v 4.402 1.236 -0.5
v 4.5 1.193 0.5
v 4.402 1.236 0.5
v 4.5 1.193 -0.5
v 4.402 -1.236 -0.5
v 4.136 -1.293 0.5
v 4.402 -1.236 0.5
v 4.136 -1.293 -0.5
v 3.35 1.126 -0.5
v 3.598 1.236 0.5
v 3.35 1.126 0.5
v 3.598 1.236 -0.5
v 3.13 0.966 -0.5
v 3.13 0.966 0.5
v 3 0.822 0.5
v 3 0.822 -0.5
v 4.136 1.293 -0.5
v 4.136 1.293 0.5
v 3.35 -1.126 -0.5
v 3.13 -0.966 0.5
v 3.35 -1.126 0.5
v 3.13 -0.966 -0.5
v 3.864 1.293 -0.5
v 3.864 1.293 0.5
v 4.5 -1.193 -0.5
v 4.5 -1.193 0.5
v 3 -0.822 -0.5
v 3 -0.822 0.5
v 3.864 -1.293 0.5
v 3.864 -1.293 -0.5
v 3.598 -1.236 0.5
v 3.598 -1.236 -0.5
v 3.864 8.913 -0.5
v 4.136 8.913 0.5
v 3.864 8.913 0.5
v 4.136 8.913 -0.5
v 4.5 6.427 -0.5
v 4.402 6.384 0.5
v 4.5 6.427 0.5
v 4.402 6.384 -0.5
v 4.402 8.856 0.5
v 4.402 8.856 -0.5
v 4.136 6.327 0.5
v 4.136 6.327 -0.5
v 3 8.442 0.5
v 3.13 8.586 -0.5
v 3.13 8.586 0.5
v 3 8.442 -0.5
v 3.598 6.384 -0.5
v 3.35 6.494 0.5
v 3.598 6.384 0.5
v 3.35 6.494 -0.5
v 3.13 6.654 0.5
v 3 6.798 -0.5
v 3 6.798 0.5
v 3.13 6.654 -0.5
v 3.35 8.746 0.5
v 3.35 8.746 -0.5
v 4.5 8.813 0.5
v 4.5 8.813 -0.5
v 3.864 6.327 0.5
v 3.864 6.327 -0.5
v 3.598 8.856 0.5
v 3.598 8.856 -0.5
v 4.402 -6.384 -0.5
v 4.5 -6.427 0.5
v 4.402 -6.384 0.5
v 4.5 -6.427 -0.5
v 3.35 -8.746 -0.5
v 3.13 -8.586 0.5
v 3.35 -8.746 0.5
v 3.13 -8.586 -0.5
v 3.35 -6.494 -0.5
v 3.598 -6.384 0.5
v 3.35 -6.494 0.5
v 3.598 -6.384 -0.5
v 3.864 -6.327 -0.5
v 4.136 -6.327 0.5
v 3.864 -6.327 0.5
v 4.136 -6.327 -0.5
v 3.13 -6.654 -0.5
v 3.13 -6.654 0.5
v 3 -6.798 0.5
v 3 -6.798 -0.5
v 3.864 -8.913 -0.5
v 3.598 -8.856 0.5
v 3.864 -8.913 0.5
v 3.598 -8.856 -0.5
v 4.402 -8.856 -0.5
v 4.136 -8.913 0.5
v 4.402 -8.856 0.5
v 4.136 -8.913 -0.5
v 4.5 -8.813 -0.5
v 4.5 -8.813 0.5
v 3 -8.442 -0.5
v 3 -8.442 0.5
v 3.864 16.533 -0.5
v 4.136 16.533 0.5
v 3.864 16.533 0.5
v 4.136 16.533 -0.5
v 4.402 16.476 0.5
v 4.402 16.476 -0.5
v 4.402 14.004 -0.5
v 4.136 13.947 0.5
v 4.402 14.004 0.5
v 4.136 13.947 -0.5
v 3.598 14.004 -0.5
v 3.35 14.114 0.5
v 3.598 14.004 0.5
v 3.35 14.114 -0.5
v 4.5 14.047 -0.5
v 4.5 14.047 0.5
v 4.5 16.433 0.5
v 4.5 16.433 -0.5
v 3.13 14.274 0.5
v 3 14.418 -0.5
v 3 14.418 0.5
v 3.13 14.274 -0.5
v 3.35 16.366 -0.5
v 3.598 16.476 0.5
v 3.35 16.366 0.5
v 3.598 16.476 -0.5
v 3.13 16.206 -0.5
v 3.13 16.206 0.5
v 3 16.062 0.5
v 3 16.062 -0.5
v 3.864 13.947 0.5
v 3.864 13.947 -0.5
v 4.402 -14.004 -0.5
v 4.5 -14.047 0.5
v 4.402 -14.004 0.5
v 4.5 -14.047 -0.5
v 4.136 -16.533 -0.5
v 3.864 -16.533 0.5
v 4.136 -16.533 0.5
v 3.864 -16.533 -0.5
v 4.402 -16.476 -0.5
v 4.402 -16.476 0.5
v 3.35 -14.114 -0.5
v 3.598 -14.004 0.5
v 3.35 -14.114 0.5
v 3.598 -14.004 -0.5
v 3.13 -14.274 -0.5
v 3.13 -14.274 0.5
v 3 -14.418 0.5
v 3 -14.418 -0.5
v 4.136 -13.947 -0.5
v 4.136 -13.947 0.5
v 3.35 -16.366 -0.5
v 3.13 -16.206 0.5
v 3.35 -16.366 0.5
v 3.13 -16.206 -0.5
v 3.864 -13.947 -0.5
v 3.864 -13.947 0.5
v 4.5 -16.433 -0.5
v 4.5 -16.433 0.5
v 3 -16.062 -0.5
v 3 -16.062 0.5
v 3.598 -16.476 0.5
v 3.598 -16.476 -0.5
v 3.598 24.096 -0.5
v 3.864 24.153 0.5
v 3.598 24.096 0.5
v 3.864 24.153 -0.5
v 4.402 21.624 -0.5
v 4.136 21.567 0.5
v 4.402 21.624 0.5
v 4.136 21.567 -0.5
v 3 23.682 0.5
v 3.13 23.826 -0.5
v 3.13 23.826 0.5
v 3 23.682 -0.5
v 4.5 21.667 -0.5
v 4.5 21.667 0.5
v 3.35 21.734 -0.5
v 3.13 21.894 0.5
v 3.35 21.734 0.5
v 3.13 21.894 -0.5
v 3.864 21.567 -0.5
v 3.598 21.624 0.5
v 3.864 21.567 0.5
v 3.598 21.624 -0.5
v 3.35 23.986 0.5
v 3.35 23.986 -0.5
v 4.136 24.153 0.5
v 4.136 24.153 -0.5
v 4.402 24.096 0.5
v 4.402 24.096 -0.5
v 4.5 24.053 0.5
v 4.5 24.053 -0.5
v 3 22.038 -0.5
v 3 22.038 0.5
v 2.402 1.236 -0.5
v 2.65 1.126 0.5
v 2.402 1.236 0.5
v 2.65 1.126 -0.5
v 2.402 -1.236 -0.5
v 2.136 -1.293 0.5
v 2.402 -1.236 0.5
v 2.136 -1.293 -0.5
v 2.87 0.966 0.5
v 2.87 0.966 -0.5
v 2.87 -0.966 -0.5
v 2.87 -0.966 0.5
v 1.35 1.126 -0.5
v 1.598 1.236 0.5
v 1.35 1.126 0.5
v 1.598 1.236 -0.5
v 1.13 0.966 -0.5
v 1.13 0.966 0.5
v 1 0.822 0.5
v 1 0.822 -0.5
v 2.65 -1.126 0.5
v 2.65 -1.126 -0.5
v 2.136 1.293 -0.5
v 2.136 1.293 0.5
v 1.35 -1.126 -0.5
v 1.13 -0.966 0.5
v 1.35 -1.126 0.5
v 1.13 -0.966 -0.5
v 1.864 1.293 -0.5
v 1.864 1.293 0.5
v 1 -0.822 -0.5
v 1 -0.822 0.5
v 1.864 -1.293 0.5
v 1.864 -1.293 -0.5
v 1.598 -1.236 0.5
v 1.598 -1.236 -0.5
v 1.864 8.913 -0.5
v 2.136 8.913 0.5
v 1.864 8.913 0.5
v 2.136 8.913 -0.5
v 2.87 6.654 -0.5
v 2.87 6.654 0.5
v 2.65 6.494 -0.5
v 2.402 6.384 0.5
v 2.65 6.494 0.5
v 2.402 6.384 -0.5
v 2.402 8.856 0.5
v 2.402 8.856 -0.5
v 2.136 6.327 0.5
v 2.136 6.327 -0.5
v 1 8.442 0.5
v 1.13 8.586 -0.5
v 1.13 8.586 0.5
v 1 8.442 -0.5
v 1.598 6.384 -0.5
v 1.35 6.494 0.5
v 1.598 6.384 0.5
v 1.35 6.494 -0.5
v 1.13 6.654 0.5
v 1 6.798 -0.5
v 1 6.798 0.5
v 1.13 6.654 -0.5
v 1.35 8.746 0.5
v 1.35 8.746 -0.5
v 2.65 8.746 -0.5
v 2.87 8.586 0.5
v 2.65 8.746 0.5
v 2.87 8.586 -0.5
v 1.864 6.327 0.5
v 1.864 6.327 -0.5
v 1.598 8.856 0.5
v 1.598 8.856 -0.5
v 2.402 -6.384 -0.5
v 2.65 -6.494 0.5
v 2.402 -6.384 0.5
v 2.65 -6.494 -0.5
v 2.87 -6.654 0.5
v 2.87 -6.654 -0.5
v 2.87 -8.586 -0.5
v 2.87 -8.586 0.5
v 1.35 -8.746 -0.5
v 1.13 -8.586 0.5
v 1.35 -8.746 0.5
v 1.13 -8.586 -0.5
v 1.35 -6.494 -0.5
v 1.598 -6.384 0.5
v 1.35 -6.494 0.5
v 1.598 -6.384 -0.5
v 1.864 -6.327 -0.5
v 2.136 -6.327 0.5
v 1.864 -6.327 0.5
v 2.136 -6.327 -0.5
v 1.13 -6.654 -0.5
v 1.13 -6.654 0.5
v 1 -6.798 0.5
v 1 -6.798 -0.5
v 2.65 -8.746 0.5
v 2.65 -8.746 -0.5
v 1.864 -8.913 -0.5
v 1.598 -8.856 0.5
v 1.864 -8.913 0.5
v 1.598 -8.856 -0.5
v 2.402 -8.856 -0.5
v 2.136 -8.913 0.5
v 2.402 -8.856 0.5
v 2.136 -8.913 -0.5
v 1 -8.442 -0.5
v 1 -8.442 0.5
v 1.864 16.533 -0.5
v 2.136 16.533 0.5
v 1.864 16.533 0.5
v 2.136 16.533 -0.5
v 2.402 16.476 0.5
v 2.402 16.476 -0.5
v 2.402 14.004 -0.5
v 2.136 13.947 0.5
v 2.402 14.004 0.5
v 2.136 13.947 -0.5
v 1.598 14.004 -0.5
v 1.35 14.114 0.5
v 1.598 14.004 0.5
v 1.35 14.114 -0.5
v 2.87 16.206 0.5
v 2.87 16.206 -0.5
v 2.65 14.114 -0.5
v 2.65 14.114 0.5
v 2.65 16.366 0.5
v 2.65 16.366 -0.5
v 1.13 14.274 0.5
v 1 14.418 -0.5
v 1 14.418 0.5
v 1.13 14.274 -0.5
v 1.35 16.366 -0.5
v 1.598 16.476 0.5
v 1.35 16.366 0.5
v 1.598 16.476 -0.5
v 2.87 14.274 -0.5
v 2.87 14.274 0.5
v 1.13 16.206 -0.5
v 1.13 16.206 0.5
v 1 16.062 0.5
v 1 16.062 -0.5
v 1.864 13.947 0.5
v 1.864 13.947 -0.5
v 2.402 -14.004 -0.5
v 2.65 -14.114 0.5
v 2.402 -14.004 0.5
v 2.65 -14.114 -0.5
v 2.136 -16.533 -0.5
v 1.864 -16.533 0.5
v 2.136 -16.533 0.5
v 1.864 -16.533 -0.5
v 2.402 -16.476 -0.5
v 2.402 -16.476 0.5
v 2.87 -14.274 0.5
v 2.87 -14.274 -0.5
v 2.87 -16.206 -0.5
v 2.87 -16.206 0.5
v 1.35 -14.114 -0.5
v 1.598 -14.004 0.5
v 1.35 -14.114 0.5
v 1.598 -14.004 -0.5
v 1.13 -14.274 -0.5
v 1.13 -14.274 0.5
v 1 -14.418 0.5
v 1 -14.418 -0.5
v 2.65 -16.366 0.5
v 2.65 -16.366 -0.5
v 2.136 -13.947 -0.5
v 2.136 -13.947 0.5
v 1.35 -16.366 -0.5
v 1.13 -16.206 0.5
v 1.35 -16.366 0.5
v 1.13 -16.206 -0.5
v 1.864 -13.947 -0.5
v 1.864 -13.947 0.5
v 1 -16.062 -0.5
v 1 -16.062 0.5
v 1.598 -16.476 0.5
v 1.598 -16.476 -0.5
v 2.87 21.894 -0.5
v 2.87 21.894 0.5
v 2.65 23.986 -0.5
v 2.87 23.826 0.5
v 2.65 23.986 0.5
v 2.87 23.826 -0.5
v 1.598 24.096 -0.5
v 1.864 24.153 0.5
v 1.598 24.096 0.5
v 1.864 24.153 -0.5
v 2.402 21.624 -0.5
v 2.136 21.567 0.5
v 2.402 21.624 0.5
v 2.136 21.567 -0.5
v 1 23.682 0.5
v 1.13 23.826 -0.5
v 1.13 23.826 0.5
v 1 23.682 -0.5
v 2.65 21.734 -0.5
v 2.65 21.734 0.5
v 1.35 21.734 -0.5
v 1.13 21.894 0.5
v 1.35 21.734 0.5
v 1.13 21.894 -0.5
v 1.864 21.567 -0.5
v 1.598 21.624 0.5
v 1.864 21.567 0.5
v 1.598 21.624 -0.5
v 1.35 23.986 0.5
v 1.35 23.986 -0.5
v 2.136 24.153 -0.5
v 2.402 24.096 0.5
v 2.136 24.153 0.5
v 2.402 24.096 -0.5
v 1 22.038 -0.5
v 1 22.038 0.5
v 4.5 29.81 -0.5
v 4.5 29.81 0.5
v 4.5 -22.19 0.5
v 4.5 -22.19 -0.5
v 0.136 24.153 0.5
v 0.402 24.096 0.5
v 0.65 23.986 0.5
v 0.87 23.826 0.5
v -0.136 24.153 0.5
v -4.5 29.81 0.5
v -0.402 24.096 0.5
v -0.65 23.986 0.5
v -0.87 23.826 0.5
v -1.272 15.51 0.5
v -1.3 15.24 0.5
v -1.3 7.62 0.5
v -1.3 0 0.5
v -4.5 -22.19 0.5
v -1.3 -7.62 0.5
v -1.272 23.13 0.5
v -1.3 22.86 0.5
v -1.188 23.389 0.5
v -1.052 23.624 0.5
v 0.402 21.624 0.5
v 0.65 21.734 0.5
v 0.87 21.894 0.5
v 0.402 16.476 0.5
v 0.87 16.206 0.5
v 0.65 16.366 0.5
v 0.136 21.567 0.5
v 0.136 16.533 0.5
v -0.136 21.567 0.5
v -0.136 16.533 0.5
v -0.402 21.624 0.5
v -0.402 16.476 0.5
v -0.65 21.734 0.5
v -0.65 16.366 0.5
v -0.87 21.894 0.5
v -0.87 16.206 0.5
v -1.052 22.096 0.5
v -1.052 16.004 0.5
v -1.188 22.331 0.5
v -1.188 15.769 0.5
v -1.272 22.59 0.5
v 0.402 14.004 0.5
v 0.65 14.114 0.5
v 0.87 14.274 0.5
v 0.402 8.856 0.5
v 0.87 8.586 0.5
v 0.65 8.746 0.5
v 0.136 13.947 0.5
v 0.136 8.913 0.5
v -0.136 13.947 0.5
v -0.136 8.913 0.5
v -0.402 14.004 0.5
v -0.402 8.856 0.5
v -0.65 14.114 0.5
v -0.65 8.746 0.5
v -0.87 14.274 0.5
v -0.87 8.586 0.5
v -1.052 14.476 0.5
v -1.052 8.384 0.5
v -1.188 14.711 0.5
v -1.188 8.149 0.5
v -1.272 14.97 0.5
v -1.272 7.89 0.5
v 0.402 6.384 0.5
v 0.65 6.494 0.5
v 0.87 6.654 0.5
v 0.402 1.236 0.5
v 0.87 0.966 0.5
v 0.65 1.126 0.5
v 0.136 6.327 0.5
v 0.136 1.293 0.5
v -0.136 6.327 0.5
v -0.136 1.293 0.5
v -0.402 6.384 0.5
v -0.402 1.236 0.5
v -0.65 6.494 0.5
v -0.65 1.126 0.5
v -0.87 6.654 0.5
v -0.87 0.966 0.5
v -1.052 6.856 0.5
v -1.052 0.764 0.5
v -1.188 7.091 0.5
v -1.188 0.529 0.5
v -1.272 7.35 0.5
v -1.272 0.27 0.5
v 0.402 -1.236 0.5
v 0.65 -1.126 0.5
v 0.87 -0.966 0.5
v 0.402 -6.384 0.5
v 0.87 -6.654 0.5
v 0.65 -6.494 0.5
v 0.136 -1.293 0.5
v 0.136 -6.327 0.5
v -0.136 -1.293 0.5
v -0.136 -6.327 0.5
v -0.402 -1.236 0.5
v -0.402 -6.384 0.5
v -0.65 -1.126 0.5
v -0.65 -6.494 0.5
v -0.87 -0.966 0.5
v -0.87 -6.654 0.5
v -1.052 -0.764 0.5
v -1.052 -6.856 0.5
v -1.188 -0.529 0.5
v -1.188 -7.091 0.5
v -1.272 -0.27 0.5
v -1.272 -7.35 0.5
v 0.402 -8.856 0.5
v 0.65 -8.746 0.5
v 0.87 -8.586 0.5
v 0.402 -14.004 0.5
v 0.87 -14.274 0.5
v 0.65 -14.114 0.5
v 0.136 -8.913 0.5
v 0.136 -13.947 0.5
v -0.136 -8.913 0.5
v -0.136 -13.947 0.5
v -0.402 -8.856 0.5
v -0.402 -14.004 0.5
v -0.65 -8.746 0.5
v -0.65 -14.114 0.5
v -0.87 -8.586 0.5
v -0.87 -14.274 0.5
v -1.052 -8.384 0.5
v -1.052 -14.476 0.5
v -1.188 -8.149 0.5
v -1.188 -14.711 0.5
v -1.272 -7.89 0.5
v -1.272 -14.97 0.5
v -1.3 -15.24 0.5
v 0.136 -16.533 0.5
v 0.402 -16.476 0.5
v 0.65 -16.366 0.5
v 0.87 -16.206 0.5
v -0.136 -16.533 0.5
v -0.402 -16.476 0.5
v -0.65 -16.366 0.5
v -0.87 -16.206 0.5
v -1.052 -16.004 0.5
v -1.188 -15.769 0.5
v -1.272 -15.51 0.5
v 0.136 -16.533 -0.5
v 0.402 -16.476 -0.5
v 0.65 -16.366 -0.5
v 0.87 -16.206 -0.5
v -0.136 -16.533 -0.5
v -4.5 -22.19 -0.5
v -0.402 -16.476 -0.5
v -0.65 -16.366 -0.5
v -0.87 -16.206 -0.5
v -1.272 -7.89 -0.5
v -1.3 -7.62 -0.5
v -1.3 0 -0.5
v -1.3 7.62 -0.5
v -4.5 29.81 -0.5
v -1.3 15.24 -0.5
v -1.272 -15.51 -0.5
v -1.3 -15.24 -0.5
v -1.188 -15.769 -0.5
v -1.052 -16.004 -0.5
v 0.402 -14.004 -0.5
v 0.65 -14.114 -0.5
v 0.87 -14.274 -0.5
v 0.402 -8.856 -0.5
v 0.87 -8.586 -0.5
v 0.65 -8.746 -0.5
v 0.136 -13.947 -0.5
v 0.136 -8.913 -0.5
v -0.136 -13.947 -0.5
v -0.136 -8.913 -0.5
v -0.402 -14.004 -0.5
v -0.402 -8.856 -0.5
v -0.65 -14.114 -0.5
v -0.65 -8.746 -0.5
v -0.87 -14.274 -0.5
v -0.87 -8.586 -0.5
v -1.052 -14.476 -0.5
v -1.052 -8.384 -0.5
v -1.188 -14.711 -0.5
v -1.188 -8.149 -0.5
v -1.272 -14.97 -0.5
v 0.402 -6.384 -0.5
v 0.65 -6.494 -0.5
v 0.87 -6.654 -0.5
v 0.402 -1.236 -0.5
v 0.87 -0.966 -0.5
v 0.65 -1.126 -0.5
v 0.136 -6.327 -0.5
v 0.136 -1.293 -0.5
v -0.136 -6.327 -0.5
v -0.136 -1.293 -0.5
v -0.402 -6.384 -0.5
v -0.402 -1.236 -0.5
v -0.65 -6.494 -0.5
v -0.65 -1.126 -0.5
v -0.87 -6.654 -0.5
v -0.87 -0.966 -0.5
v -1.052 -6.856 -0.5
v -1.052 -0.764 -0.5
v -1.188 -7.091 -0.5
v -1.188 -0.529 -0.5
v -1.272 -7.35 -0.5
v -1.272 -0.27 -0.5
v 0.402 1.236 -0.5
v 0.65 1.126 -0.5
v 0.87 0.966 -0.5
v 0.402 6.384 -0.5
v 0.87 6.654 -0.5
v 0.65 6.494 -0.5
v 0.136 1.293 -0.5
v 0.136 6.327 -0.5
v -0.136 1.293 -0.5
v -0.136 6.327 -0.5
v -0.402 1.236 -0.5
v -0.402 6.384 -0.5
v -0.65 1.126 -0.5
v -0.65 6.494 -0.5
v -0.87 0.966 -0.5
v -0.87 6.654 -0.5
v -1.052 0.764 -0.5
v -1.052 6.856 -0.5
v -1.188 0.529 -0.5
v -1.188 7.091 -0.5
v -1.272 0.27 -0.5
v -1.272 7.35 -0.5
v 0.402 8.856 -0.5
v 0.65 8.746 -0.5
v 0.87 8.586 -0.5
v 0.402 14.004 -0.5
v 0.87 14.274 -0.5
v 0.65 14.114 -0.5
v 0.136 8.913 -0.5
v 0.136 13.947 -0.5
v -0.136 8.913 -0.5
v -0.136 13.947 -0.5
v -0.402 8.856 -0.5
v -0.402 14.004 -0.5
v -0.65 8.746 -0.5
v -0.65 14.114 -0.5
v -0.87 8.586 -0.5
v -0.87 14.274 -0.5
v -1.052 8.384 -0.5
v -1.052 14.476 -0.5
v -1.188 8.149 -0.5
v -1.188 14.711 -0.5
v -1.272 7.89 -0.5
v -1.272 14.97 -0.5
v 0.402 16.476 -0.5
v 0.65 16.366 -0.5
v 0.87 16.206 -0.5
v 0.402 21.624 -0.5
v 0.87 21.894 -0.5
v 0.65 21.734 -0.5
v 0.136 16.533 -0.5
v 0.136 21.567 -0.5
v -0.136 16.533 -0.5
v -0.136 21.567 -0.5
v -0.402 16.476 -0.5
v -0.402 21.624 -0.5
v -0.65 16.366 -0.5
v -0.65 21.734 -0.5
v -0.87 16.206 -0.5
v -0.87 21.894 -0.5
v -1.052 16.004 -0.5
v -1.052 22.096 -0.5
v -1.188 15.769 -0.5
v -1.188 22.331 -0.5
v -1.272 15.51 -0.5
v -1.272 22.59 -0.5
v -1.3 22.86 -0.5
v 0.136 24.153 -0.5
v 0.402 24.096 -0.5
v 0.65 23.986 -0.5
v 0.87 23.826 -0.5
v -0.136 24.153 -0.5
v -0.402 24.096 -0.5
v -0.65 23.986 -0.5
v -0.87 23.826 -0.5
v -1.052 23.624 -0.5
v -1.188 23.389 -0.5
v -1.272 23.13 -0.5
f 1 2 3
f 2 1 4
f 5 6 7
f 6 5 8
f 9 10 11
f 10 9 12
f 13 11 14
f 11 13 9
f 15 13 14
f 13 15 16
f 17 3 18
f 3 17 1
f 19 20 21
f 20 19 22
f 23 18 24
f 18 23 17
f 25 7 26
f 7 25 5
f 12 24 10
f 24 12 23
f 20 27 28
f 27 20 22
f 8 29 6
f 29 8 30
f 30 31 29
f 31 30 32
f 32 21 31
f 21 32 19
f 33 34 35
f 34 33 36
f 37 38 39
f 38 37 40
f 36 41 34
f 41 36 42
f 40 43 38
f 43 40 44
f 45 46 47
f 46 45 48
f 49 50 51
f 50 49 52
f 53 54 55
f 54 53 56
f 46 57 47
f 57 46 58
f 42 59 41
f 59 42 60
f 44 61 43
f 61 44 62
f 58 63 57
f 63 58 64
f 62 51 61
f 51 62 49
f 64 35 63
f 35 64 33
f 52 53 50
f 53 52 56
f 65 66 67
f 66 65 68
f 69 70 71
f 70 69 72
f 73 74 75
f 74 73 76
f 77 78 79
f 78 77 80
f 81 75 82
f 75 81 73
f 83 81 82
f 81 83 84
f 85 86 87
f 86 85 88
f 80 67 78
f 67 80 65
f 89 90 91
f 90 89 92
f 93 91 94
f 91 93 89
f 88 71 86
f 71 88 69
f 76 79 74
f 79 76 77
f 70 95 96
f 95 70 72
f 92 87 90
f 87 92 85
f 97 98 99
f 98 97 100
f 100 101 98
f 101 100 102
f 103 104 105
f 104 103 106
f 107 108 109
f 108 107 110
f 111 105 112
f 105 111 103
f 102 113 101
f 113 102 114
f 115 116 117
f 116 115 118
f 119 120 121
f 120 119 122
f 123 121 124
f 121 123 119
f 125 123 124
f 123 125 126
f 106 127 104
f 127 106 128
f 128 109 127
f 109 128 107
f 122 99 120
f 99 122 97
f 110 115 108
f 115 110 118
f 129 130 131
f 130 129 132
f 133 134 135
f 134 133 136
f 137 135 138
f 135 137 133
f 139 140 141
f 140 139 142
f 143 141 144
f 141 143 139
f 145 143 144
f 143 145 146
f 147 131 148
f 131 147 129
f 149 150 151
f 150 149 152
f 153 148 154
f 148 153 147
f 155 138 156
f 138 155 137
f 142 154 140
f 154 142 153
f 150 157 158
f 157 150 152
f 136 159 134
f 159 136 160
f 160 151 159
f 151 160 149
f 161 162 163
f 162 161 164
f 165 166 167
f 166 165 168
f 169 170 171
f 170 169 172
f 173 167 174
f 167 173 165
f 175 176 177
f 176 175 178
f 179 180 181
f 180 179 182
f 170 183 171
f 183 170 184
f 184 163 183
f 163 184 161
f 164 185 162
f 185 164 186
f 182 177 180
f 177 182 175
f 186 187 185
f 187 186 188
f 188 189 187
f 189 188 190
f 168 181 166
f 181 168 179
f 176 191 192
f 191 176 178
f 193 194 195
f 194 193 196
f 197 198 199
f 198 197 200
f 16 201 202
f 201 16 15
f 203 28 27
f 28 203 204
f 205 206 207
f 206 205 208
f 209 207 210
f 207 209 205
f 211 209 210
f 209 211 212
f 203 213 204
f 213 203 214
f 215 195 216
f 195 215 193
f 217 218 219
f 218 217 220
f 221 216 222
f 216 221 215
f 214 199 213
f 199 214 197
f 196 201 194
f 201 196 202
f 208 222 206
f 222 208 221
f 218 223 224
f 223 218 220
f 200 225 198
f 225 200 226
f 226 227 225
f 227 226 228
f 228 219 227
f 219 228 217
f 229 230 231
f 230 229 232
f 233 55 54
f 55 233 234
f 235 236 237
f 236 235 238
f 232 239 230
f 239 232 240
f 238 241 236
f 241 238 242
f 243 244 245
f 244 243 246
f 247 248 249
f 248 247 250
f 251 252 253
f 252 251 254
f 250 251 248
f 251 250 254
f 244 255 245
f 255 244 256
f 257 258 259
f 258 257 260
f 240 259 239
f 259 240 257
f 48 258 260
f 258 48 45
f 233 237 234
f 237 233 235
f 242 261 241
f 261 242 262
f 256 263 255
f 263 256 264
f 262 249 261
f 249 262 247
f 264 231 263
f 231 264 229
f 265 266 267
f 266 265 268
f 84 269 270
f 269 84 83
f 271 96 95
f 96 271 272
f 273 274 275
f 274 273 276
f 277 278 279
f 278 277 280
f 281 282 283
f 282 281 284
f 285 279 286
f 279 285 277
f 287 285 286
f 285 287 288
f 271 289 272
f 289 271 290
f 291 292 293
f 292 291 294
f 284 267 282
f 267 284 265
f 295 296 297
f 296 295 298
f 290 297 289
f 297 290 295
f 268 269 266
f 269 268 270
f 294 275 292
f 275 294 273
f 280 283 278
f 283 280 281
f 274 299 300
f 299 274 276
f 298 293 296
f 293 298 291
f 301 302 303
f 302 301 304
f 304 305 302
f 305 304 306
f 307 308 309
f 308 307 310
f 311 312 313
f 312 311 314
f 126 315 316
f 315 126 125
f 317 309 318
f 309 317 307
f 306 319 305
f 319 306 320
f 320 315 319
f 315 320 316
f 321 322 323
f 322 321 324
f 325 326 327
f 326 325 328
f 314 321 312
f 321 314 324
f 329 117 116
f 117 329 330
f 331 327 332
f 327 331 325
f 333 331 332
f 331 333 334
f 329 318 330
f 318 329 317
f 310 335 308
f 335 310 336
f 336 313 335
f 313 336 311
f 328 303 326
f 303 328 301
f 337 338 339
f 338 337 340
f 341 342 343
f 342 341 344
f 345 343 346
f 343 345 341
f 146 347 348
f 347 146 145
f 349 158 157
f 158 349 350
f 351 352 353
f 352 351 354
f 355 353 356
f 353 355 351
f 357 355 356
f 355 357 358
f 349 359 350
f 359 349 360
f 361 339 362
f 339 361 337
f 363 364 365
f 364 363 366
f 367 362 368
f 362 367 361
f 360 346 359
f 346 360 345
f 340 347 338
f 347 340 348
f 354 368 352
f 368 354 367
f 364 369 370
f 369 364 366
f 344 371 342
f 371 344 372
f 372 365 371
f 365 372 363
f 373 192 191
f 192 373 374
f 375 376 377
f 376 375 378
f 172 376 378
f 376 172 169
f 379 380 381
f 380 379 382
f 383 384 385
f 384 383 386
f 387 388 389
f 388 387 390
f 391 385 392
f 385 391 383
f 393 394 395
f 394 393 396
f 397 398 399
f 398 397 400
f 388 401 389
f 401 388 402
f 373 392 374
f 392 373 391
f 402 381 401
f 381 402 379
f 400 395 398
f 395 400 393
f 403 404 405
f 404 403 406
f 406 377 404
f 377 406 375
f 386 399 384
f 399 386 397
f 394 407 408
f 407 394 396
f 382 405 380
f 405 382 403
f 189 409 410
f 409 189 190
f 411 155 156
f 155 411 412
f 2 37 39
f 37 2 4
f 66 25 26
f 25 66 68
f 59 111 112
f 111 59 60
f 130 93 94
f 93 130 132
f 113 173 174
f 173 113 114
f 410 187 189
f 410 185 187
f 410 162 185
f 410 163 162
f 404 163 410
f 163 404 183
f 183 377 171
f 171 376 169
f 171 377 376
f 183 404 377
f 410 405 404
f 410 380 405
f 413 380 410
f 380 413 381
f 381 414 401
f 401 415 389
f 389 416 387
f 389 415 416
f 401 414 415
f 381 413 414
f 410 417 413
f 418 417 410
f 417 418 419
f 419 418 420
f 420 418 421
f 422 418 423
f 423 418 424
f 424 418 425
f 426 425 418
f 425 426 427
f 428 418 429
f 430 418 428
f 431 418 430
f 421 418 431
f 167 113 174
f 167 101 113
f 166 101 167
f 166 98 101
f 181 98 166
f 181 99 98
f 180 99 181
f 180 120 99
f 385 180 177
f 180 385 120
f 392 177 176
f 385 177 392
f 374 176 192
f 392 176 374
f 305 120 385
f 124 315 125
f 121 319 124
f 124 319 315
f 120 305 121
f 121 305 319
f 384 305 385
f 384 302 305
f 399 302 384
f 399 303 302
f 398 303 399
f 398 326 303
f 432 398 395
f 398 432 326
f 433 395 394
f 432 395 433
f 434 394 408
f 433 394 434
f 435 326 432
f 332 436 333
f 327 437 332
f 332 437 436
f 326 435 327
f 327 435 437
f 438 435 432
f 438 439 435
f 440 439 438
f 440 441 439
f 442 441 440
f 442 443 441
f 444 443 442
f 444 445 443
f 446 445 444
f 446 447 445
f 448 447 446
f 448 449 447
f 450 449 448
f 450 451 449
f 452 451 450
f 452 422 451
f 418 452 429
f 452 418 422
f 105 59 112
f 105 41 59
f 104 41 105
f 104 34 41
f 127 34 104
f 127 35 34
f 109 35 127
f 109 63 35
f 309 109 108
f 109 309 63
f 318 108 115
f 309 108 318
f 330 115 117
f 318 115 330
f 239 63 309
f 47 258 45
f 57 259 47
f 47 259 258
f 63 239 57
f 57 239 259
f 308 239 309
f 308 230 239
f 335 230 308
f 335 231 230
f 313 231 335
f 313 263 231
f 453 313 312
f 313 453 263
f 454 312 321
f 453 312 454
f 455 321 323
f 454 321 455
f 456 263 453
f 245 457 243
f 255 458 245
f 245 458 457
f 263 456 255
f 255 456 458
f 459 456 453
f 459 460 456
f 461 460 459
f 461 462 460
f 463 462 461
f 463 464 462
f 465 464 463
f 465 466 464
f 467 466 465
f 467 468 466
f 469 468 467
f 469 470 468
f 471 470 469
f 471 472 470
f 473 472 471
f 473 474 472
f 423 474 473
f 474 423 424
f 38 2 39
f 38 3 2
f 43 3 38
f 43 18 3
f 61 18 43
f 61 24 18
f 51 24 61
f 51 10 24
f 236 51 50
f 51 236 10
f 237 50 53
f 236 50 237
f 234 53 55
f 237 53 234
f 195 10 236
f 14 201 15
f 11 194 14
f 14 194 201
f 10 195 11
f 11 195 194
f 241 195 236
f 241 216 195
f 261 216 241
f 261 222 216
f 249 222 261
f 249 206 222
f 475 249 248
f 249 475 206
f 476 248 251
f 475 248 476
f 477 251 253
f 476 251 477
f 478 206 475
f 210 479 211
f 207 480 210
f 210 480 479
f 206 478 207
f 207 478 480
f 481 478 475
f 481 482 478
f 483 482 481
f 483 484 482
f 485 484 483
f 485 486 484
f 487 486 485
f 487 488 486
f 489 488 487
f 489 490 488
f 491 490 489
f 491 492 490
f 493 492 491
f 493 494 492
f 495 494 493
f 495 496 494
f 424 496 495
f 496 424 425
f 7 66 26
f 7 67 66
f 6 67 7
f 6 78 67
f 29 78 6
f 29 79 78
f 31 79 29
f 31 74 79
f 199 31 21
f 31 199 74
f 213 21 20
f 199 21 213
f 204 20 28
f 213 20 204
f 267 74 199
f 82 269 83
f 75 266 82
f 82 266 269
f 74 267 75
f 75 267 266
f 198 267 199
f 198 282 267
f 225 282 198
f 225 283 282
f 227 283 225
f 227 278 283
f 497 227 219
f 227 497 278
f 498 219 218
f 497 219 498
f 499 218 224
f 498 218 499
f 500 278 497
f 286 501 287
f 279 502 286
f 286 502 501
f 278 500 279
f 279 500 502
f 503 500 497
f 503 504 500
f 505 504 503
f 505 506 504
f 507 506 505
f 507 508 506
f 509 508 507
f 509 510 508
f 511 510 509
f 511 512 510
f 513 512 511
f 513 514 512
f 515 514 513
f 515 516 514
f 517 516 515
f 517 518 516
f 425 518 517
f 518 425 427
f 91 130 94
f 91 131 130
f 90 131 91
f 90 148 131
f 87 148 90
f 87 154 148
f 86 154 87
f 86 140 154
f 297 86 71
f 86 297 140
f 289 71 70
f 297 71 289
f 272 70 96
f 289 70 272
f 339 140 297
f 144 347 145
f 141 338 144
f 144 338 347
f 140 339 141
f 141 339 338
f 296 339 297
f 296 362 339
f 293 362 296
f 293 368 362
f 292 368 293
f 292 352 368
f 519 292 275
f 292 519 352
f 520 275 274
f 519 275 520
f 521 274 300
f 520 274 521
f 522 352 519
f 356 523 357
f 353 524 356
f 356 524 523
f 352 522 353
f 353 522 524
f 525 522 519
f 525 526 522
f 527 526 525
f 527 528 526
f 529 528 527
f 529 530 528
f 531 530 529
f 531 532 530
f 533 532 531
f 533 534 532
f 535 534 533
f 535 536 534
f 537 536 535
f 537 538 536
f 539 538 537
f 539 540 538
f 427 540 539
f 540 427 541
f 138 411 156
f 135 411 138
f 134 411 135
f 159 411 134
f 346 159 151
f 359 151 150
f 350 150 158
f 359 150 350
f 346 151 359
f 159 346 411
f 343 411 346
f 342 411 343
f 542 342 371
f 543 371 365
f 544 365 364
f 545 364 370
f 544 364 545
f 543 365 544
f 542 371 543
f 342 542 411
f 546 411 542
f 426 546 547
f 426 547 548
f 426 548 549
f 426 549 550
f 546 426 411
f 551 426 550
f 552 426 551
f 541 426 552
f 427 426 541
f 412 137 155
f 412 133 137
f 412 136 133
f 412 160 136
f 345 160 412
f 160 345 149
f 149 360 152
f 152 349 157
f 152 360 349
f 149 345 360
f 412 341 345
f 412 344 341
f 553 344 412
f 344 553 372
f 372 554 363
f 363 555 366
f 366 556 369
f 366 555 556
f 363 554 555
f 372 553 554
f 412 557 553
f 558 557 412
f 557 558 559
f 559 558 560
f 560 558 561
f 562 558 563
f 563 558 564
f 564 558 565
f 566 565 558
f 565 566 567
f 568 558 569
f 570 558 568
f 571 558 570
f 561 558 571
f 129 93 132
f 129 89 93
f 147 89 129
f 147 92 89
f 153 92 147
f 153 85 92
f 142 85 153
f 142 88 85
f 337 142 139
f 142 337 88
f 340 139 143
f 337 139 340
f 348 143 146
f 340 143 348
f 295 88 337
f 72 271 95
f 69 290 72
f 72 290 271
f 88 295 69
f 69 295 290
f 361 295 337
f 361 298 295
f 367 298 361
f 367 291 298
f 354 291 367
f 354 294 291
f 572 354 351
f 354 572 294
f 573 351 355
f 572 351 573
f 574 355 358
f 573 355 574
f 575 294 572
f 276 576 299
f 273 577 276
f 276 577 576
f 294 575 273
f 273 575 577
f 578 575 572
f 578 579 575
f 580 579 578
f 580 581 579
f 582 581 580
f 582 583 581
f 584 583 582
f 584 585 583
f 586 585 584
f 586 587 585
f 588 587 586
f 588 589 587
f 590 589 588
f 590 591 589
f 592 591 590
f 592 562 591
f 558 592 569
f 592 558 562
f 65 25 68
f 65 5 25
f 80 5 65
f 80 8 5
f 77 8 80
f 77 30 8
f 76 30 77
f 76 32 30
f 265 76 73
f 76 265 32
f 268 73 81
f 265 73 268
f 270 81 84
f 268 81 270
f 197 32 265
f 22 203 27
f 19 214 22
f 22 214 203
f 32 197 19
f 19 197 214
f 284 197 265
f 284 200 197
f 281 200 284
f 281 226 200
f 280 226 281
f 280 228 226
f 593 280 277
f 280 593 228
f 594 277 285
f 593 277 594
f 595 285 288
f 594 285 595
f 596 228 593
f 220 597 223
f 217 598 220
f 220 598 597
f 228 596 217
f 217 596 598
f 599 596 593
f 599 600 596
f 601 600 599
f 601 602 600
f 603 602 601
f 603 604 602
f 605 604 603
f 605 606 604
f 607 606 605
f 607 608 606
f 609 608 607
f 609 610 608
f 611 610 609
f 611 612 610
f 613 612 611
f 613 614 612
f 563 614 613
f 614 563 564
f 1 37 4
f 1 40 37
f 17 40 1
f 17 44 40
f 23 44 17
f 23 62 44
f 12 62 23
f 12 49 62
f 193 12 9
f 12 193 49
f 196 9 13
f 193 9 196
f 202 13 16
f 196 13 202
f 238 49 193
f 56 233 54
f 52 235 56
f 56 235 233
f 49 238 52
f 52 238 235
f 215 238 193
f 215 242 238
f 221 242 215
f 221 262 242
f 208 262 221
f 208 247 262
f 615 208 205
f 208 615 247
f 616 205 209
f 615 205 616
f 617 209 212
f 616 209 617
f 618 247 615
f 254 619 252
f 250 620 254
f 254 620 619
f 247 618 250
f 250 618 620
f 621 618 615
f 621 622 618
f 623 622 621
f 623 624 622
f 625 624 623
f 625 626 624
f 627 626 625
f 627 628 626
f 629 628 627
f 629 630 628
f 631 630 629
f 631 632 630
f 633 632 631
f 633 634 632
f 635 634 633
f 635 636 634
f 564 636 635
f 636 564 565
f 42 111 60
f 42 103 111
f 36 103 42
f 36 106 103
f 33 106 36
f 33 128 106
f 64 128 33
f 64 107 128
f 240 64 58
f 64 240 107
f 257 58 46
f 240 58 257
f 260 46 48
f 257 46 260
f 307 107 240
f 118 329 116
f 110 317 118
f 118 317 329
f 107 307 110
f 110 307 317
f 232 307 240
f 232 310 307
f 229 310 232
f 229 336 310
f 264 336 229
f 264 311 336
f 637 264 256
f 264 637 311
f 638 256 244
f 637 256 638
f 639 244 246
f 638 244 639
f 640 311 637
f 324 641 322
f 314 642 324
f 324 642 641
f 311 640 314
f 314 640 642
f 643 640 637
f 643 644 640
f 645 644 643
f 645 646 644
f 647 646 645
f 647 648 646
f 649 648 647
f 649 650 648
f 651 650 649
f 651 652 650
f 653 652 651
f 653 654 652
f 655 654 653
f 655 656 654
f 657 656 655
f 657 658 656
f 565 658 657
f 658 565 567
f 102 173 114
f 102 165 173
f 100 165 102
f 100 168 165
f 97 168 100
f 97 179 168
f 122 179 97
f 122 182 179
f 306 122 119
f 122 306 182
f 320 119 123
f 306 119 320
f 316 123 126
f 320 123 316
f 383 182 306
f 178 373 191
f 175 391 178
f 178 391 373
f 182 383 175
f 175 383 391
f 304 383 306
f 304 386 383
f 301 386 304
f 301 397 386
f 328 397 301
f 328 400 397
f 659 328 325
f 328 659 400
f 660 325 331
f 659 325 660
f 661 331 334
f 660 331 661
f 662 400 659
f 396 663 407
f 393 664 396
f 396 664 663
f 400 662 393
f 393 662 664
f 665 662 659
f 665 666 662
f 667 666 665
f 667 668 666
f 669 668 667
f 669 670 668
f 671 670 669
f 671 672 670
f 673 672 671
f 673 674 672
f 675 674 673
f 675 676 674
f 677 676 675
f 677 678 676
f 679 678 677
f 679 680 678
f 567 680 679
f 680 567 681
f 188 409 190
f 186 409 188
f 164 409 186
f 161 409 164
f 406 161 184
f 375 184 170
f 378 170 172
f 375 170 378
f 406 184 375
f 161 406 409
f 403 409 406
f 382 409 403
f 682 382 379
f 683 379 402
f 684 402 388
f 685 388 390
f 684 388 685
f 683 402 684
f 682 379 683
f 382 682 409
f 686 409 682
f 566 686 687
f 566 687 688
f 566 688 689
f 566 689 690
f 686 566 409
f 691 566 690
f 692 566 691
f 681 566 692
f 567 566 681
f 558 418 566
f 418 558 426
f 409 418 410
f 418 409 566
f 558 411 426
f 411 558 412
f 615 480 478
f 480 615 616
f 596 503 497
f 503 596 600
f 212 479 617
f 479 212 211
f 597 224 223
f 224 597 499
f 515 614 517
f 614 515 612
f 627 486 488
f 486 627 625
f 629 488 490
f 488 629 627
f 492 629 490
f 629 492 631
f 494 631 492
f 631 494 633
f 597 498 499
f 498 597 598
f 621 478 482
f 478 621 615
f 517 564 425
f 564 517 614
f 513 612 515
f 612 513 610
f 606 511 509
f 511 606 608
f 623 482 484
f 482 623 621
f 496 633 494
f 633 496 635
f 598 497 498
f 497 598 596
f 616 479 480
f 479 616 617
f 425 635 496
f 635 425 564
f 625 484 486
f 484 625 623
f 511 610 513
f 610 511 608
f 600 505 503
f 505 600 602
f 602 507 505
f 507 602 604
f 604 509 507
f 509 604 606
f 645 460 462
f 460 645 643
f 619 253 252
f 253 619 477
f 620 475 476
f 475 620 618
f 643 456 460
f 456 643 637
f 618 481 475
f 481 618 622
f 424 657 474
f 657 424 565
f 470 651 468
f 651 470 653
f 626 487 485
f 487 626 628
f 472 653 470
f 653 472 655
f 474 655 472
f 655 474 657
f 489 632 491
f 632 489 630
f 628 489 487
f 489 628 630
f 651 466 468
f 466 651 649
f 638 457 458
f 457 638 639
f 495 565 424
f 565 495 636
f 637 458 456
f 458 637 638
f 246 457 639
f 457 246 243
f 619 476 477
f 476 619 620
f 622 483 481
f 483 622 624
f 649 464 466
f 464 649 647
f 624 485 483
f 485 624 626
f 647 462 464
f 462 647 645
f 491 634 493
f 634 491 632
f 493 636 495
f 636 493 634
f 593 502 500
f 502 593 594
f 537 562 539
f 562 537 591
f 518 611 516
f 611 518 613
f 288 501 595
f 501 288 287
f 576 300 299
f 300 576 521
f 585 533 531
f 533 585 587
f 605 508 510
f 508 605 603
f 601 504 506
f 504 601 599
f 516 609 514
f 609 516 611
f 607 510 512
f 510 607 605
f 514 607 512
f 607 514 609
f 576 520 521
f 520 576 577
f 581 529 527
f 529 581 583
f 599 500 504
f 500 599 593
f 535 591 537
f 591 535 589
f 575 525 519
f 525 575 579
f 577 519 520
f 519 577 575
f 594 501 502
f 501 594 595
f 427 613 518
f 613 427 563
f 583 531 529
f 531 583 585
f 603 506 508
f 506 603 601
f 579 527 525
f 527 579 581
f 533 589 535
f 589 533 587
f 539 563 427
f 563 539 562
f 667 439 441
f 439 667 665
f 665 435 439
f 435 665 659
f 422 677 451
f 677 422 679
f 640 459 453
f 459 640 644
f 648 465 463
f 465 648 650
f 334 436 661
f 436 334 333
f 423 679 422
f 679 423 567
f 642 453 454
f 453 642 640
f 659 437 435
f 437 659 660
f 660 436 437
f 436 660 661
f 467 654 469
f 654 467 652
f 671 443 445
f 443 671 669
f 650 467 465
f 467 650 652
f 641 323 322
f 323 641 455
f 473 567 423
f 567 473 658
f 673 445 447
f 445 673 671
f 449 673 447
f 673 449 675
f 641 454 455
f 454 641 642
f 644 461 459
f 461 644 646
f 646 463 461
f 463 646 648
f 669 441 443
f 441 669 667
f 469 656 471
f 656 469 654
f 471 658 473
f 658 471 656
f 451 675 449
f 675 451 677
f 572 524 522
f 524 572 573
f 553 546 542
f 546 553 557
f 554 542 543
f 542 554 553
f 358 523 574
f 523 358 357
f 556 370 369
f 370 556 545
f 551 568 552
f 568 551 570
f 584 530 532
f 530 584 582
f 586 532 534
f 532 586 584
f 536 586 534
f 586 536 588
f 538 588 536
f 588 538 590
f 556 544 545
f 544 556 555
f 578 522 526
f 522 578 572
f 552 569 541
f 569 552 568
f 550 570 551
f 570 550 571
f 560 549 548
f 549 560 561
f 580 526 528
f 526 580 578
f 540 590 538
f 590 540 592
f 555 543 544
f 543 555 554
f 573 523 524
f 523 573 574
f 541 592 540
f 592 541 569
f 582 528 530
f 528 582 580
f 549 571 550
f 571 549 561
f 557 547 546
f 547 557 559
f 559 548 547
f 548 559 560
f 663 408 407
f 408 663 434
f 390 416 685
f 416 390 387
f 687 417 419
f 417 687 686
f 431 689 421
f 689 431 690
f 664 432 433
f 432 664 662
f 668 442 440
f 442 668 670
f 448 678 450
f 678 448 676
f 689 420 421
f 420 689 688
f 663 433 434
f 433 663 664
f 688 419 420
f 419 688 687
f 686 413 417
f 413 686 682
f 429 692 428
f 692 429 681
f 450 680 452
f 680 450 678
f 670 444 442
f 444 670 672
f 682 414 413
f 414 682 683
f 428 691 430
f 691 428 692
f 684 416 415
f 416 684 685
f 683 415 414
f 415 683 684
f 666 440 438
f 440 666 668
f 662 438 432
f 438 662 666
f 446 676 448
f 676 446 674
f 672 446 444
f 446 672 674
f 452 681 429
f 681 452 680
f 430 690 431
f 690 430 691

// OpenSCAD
//LDRAligner.scad (c) by Embecosm Ltd.
//
//LDRAligner.scad is licensed under a
//Creative Commons Attribution-ShareAlike 4.0 International License.
//
//You should have received a copy of the license along with this
//work. If not, see <http://creativecommons.org/licenses/by-sa/4.0/>.

difference(){
    translate([0,3.81,0])
        cube([9,52,1],center=true);
    cylinder(r=1.3, h=4, center=true, $fn=30);
    translate([0,7.62,0])
            cylinder(r=1.3, h=4, center=true, $fn=30);
    translate([0,-7.62,0])
            cylinder(r=1.3, h=4, center=true, $fn=30);
    translate([0,15.24,0])
            cylinder(r=1.3, h=4, center=true, $fn=30);
    translate([0,-15.24,0])
            cylinder(r=1.3, h=4, center=true, $fn=30);
    translate([0,22.86,0])
            cylinder(r=1.3, h=4, center=true, $fn=30);
    translate([4,0,0]){
            cylinder(r=1.3, h=4, center=true, $fn=30);
        translate([0,7.62,0])
                cylinder(r=1.3, h=4, center=true, $fn=30);
        translate([0,-7.62,0])
                cylinder(r=1.3, h=4, center=true, $fn=30);
        translate([0,15.24,0])
                cylinder(r=1.3, h=4, center=true, $fn=30);
        translate([0,-15.24,0])
                cylinder(r=1.3, h=4, center=true, $fn=30);
        translate([0,22.86,0])
                cylinder(r=1.3, h=4, center=true, $fn=30);
    };
    translate([2,0,0]){
            cylinder(r=1.3, h=4, center=true, $fn=30);
        translate([0,7.62,0])
                cylinder(r=1.3, h=4, center=true, $fn=30);
        translate([0,-7.62,0])
                cylinder(r=1.3, h=4, center=true, $fn=30);
        translate([0,15.24,0])
                cylinder(r=1.3, h=4, center=true, $fn=30);
        translate([0,-15.24,0])
                cylinder(r=1.3, h=4, center=true, $fn=30);
        translate([0,22.86,0])
                cylinder(r=1.3, h=4, center=true, $fn=30);
    };
};
